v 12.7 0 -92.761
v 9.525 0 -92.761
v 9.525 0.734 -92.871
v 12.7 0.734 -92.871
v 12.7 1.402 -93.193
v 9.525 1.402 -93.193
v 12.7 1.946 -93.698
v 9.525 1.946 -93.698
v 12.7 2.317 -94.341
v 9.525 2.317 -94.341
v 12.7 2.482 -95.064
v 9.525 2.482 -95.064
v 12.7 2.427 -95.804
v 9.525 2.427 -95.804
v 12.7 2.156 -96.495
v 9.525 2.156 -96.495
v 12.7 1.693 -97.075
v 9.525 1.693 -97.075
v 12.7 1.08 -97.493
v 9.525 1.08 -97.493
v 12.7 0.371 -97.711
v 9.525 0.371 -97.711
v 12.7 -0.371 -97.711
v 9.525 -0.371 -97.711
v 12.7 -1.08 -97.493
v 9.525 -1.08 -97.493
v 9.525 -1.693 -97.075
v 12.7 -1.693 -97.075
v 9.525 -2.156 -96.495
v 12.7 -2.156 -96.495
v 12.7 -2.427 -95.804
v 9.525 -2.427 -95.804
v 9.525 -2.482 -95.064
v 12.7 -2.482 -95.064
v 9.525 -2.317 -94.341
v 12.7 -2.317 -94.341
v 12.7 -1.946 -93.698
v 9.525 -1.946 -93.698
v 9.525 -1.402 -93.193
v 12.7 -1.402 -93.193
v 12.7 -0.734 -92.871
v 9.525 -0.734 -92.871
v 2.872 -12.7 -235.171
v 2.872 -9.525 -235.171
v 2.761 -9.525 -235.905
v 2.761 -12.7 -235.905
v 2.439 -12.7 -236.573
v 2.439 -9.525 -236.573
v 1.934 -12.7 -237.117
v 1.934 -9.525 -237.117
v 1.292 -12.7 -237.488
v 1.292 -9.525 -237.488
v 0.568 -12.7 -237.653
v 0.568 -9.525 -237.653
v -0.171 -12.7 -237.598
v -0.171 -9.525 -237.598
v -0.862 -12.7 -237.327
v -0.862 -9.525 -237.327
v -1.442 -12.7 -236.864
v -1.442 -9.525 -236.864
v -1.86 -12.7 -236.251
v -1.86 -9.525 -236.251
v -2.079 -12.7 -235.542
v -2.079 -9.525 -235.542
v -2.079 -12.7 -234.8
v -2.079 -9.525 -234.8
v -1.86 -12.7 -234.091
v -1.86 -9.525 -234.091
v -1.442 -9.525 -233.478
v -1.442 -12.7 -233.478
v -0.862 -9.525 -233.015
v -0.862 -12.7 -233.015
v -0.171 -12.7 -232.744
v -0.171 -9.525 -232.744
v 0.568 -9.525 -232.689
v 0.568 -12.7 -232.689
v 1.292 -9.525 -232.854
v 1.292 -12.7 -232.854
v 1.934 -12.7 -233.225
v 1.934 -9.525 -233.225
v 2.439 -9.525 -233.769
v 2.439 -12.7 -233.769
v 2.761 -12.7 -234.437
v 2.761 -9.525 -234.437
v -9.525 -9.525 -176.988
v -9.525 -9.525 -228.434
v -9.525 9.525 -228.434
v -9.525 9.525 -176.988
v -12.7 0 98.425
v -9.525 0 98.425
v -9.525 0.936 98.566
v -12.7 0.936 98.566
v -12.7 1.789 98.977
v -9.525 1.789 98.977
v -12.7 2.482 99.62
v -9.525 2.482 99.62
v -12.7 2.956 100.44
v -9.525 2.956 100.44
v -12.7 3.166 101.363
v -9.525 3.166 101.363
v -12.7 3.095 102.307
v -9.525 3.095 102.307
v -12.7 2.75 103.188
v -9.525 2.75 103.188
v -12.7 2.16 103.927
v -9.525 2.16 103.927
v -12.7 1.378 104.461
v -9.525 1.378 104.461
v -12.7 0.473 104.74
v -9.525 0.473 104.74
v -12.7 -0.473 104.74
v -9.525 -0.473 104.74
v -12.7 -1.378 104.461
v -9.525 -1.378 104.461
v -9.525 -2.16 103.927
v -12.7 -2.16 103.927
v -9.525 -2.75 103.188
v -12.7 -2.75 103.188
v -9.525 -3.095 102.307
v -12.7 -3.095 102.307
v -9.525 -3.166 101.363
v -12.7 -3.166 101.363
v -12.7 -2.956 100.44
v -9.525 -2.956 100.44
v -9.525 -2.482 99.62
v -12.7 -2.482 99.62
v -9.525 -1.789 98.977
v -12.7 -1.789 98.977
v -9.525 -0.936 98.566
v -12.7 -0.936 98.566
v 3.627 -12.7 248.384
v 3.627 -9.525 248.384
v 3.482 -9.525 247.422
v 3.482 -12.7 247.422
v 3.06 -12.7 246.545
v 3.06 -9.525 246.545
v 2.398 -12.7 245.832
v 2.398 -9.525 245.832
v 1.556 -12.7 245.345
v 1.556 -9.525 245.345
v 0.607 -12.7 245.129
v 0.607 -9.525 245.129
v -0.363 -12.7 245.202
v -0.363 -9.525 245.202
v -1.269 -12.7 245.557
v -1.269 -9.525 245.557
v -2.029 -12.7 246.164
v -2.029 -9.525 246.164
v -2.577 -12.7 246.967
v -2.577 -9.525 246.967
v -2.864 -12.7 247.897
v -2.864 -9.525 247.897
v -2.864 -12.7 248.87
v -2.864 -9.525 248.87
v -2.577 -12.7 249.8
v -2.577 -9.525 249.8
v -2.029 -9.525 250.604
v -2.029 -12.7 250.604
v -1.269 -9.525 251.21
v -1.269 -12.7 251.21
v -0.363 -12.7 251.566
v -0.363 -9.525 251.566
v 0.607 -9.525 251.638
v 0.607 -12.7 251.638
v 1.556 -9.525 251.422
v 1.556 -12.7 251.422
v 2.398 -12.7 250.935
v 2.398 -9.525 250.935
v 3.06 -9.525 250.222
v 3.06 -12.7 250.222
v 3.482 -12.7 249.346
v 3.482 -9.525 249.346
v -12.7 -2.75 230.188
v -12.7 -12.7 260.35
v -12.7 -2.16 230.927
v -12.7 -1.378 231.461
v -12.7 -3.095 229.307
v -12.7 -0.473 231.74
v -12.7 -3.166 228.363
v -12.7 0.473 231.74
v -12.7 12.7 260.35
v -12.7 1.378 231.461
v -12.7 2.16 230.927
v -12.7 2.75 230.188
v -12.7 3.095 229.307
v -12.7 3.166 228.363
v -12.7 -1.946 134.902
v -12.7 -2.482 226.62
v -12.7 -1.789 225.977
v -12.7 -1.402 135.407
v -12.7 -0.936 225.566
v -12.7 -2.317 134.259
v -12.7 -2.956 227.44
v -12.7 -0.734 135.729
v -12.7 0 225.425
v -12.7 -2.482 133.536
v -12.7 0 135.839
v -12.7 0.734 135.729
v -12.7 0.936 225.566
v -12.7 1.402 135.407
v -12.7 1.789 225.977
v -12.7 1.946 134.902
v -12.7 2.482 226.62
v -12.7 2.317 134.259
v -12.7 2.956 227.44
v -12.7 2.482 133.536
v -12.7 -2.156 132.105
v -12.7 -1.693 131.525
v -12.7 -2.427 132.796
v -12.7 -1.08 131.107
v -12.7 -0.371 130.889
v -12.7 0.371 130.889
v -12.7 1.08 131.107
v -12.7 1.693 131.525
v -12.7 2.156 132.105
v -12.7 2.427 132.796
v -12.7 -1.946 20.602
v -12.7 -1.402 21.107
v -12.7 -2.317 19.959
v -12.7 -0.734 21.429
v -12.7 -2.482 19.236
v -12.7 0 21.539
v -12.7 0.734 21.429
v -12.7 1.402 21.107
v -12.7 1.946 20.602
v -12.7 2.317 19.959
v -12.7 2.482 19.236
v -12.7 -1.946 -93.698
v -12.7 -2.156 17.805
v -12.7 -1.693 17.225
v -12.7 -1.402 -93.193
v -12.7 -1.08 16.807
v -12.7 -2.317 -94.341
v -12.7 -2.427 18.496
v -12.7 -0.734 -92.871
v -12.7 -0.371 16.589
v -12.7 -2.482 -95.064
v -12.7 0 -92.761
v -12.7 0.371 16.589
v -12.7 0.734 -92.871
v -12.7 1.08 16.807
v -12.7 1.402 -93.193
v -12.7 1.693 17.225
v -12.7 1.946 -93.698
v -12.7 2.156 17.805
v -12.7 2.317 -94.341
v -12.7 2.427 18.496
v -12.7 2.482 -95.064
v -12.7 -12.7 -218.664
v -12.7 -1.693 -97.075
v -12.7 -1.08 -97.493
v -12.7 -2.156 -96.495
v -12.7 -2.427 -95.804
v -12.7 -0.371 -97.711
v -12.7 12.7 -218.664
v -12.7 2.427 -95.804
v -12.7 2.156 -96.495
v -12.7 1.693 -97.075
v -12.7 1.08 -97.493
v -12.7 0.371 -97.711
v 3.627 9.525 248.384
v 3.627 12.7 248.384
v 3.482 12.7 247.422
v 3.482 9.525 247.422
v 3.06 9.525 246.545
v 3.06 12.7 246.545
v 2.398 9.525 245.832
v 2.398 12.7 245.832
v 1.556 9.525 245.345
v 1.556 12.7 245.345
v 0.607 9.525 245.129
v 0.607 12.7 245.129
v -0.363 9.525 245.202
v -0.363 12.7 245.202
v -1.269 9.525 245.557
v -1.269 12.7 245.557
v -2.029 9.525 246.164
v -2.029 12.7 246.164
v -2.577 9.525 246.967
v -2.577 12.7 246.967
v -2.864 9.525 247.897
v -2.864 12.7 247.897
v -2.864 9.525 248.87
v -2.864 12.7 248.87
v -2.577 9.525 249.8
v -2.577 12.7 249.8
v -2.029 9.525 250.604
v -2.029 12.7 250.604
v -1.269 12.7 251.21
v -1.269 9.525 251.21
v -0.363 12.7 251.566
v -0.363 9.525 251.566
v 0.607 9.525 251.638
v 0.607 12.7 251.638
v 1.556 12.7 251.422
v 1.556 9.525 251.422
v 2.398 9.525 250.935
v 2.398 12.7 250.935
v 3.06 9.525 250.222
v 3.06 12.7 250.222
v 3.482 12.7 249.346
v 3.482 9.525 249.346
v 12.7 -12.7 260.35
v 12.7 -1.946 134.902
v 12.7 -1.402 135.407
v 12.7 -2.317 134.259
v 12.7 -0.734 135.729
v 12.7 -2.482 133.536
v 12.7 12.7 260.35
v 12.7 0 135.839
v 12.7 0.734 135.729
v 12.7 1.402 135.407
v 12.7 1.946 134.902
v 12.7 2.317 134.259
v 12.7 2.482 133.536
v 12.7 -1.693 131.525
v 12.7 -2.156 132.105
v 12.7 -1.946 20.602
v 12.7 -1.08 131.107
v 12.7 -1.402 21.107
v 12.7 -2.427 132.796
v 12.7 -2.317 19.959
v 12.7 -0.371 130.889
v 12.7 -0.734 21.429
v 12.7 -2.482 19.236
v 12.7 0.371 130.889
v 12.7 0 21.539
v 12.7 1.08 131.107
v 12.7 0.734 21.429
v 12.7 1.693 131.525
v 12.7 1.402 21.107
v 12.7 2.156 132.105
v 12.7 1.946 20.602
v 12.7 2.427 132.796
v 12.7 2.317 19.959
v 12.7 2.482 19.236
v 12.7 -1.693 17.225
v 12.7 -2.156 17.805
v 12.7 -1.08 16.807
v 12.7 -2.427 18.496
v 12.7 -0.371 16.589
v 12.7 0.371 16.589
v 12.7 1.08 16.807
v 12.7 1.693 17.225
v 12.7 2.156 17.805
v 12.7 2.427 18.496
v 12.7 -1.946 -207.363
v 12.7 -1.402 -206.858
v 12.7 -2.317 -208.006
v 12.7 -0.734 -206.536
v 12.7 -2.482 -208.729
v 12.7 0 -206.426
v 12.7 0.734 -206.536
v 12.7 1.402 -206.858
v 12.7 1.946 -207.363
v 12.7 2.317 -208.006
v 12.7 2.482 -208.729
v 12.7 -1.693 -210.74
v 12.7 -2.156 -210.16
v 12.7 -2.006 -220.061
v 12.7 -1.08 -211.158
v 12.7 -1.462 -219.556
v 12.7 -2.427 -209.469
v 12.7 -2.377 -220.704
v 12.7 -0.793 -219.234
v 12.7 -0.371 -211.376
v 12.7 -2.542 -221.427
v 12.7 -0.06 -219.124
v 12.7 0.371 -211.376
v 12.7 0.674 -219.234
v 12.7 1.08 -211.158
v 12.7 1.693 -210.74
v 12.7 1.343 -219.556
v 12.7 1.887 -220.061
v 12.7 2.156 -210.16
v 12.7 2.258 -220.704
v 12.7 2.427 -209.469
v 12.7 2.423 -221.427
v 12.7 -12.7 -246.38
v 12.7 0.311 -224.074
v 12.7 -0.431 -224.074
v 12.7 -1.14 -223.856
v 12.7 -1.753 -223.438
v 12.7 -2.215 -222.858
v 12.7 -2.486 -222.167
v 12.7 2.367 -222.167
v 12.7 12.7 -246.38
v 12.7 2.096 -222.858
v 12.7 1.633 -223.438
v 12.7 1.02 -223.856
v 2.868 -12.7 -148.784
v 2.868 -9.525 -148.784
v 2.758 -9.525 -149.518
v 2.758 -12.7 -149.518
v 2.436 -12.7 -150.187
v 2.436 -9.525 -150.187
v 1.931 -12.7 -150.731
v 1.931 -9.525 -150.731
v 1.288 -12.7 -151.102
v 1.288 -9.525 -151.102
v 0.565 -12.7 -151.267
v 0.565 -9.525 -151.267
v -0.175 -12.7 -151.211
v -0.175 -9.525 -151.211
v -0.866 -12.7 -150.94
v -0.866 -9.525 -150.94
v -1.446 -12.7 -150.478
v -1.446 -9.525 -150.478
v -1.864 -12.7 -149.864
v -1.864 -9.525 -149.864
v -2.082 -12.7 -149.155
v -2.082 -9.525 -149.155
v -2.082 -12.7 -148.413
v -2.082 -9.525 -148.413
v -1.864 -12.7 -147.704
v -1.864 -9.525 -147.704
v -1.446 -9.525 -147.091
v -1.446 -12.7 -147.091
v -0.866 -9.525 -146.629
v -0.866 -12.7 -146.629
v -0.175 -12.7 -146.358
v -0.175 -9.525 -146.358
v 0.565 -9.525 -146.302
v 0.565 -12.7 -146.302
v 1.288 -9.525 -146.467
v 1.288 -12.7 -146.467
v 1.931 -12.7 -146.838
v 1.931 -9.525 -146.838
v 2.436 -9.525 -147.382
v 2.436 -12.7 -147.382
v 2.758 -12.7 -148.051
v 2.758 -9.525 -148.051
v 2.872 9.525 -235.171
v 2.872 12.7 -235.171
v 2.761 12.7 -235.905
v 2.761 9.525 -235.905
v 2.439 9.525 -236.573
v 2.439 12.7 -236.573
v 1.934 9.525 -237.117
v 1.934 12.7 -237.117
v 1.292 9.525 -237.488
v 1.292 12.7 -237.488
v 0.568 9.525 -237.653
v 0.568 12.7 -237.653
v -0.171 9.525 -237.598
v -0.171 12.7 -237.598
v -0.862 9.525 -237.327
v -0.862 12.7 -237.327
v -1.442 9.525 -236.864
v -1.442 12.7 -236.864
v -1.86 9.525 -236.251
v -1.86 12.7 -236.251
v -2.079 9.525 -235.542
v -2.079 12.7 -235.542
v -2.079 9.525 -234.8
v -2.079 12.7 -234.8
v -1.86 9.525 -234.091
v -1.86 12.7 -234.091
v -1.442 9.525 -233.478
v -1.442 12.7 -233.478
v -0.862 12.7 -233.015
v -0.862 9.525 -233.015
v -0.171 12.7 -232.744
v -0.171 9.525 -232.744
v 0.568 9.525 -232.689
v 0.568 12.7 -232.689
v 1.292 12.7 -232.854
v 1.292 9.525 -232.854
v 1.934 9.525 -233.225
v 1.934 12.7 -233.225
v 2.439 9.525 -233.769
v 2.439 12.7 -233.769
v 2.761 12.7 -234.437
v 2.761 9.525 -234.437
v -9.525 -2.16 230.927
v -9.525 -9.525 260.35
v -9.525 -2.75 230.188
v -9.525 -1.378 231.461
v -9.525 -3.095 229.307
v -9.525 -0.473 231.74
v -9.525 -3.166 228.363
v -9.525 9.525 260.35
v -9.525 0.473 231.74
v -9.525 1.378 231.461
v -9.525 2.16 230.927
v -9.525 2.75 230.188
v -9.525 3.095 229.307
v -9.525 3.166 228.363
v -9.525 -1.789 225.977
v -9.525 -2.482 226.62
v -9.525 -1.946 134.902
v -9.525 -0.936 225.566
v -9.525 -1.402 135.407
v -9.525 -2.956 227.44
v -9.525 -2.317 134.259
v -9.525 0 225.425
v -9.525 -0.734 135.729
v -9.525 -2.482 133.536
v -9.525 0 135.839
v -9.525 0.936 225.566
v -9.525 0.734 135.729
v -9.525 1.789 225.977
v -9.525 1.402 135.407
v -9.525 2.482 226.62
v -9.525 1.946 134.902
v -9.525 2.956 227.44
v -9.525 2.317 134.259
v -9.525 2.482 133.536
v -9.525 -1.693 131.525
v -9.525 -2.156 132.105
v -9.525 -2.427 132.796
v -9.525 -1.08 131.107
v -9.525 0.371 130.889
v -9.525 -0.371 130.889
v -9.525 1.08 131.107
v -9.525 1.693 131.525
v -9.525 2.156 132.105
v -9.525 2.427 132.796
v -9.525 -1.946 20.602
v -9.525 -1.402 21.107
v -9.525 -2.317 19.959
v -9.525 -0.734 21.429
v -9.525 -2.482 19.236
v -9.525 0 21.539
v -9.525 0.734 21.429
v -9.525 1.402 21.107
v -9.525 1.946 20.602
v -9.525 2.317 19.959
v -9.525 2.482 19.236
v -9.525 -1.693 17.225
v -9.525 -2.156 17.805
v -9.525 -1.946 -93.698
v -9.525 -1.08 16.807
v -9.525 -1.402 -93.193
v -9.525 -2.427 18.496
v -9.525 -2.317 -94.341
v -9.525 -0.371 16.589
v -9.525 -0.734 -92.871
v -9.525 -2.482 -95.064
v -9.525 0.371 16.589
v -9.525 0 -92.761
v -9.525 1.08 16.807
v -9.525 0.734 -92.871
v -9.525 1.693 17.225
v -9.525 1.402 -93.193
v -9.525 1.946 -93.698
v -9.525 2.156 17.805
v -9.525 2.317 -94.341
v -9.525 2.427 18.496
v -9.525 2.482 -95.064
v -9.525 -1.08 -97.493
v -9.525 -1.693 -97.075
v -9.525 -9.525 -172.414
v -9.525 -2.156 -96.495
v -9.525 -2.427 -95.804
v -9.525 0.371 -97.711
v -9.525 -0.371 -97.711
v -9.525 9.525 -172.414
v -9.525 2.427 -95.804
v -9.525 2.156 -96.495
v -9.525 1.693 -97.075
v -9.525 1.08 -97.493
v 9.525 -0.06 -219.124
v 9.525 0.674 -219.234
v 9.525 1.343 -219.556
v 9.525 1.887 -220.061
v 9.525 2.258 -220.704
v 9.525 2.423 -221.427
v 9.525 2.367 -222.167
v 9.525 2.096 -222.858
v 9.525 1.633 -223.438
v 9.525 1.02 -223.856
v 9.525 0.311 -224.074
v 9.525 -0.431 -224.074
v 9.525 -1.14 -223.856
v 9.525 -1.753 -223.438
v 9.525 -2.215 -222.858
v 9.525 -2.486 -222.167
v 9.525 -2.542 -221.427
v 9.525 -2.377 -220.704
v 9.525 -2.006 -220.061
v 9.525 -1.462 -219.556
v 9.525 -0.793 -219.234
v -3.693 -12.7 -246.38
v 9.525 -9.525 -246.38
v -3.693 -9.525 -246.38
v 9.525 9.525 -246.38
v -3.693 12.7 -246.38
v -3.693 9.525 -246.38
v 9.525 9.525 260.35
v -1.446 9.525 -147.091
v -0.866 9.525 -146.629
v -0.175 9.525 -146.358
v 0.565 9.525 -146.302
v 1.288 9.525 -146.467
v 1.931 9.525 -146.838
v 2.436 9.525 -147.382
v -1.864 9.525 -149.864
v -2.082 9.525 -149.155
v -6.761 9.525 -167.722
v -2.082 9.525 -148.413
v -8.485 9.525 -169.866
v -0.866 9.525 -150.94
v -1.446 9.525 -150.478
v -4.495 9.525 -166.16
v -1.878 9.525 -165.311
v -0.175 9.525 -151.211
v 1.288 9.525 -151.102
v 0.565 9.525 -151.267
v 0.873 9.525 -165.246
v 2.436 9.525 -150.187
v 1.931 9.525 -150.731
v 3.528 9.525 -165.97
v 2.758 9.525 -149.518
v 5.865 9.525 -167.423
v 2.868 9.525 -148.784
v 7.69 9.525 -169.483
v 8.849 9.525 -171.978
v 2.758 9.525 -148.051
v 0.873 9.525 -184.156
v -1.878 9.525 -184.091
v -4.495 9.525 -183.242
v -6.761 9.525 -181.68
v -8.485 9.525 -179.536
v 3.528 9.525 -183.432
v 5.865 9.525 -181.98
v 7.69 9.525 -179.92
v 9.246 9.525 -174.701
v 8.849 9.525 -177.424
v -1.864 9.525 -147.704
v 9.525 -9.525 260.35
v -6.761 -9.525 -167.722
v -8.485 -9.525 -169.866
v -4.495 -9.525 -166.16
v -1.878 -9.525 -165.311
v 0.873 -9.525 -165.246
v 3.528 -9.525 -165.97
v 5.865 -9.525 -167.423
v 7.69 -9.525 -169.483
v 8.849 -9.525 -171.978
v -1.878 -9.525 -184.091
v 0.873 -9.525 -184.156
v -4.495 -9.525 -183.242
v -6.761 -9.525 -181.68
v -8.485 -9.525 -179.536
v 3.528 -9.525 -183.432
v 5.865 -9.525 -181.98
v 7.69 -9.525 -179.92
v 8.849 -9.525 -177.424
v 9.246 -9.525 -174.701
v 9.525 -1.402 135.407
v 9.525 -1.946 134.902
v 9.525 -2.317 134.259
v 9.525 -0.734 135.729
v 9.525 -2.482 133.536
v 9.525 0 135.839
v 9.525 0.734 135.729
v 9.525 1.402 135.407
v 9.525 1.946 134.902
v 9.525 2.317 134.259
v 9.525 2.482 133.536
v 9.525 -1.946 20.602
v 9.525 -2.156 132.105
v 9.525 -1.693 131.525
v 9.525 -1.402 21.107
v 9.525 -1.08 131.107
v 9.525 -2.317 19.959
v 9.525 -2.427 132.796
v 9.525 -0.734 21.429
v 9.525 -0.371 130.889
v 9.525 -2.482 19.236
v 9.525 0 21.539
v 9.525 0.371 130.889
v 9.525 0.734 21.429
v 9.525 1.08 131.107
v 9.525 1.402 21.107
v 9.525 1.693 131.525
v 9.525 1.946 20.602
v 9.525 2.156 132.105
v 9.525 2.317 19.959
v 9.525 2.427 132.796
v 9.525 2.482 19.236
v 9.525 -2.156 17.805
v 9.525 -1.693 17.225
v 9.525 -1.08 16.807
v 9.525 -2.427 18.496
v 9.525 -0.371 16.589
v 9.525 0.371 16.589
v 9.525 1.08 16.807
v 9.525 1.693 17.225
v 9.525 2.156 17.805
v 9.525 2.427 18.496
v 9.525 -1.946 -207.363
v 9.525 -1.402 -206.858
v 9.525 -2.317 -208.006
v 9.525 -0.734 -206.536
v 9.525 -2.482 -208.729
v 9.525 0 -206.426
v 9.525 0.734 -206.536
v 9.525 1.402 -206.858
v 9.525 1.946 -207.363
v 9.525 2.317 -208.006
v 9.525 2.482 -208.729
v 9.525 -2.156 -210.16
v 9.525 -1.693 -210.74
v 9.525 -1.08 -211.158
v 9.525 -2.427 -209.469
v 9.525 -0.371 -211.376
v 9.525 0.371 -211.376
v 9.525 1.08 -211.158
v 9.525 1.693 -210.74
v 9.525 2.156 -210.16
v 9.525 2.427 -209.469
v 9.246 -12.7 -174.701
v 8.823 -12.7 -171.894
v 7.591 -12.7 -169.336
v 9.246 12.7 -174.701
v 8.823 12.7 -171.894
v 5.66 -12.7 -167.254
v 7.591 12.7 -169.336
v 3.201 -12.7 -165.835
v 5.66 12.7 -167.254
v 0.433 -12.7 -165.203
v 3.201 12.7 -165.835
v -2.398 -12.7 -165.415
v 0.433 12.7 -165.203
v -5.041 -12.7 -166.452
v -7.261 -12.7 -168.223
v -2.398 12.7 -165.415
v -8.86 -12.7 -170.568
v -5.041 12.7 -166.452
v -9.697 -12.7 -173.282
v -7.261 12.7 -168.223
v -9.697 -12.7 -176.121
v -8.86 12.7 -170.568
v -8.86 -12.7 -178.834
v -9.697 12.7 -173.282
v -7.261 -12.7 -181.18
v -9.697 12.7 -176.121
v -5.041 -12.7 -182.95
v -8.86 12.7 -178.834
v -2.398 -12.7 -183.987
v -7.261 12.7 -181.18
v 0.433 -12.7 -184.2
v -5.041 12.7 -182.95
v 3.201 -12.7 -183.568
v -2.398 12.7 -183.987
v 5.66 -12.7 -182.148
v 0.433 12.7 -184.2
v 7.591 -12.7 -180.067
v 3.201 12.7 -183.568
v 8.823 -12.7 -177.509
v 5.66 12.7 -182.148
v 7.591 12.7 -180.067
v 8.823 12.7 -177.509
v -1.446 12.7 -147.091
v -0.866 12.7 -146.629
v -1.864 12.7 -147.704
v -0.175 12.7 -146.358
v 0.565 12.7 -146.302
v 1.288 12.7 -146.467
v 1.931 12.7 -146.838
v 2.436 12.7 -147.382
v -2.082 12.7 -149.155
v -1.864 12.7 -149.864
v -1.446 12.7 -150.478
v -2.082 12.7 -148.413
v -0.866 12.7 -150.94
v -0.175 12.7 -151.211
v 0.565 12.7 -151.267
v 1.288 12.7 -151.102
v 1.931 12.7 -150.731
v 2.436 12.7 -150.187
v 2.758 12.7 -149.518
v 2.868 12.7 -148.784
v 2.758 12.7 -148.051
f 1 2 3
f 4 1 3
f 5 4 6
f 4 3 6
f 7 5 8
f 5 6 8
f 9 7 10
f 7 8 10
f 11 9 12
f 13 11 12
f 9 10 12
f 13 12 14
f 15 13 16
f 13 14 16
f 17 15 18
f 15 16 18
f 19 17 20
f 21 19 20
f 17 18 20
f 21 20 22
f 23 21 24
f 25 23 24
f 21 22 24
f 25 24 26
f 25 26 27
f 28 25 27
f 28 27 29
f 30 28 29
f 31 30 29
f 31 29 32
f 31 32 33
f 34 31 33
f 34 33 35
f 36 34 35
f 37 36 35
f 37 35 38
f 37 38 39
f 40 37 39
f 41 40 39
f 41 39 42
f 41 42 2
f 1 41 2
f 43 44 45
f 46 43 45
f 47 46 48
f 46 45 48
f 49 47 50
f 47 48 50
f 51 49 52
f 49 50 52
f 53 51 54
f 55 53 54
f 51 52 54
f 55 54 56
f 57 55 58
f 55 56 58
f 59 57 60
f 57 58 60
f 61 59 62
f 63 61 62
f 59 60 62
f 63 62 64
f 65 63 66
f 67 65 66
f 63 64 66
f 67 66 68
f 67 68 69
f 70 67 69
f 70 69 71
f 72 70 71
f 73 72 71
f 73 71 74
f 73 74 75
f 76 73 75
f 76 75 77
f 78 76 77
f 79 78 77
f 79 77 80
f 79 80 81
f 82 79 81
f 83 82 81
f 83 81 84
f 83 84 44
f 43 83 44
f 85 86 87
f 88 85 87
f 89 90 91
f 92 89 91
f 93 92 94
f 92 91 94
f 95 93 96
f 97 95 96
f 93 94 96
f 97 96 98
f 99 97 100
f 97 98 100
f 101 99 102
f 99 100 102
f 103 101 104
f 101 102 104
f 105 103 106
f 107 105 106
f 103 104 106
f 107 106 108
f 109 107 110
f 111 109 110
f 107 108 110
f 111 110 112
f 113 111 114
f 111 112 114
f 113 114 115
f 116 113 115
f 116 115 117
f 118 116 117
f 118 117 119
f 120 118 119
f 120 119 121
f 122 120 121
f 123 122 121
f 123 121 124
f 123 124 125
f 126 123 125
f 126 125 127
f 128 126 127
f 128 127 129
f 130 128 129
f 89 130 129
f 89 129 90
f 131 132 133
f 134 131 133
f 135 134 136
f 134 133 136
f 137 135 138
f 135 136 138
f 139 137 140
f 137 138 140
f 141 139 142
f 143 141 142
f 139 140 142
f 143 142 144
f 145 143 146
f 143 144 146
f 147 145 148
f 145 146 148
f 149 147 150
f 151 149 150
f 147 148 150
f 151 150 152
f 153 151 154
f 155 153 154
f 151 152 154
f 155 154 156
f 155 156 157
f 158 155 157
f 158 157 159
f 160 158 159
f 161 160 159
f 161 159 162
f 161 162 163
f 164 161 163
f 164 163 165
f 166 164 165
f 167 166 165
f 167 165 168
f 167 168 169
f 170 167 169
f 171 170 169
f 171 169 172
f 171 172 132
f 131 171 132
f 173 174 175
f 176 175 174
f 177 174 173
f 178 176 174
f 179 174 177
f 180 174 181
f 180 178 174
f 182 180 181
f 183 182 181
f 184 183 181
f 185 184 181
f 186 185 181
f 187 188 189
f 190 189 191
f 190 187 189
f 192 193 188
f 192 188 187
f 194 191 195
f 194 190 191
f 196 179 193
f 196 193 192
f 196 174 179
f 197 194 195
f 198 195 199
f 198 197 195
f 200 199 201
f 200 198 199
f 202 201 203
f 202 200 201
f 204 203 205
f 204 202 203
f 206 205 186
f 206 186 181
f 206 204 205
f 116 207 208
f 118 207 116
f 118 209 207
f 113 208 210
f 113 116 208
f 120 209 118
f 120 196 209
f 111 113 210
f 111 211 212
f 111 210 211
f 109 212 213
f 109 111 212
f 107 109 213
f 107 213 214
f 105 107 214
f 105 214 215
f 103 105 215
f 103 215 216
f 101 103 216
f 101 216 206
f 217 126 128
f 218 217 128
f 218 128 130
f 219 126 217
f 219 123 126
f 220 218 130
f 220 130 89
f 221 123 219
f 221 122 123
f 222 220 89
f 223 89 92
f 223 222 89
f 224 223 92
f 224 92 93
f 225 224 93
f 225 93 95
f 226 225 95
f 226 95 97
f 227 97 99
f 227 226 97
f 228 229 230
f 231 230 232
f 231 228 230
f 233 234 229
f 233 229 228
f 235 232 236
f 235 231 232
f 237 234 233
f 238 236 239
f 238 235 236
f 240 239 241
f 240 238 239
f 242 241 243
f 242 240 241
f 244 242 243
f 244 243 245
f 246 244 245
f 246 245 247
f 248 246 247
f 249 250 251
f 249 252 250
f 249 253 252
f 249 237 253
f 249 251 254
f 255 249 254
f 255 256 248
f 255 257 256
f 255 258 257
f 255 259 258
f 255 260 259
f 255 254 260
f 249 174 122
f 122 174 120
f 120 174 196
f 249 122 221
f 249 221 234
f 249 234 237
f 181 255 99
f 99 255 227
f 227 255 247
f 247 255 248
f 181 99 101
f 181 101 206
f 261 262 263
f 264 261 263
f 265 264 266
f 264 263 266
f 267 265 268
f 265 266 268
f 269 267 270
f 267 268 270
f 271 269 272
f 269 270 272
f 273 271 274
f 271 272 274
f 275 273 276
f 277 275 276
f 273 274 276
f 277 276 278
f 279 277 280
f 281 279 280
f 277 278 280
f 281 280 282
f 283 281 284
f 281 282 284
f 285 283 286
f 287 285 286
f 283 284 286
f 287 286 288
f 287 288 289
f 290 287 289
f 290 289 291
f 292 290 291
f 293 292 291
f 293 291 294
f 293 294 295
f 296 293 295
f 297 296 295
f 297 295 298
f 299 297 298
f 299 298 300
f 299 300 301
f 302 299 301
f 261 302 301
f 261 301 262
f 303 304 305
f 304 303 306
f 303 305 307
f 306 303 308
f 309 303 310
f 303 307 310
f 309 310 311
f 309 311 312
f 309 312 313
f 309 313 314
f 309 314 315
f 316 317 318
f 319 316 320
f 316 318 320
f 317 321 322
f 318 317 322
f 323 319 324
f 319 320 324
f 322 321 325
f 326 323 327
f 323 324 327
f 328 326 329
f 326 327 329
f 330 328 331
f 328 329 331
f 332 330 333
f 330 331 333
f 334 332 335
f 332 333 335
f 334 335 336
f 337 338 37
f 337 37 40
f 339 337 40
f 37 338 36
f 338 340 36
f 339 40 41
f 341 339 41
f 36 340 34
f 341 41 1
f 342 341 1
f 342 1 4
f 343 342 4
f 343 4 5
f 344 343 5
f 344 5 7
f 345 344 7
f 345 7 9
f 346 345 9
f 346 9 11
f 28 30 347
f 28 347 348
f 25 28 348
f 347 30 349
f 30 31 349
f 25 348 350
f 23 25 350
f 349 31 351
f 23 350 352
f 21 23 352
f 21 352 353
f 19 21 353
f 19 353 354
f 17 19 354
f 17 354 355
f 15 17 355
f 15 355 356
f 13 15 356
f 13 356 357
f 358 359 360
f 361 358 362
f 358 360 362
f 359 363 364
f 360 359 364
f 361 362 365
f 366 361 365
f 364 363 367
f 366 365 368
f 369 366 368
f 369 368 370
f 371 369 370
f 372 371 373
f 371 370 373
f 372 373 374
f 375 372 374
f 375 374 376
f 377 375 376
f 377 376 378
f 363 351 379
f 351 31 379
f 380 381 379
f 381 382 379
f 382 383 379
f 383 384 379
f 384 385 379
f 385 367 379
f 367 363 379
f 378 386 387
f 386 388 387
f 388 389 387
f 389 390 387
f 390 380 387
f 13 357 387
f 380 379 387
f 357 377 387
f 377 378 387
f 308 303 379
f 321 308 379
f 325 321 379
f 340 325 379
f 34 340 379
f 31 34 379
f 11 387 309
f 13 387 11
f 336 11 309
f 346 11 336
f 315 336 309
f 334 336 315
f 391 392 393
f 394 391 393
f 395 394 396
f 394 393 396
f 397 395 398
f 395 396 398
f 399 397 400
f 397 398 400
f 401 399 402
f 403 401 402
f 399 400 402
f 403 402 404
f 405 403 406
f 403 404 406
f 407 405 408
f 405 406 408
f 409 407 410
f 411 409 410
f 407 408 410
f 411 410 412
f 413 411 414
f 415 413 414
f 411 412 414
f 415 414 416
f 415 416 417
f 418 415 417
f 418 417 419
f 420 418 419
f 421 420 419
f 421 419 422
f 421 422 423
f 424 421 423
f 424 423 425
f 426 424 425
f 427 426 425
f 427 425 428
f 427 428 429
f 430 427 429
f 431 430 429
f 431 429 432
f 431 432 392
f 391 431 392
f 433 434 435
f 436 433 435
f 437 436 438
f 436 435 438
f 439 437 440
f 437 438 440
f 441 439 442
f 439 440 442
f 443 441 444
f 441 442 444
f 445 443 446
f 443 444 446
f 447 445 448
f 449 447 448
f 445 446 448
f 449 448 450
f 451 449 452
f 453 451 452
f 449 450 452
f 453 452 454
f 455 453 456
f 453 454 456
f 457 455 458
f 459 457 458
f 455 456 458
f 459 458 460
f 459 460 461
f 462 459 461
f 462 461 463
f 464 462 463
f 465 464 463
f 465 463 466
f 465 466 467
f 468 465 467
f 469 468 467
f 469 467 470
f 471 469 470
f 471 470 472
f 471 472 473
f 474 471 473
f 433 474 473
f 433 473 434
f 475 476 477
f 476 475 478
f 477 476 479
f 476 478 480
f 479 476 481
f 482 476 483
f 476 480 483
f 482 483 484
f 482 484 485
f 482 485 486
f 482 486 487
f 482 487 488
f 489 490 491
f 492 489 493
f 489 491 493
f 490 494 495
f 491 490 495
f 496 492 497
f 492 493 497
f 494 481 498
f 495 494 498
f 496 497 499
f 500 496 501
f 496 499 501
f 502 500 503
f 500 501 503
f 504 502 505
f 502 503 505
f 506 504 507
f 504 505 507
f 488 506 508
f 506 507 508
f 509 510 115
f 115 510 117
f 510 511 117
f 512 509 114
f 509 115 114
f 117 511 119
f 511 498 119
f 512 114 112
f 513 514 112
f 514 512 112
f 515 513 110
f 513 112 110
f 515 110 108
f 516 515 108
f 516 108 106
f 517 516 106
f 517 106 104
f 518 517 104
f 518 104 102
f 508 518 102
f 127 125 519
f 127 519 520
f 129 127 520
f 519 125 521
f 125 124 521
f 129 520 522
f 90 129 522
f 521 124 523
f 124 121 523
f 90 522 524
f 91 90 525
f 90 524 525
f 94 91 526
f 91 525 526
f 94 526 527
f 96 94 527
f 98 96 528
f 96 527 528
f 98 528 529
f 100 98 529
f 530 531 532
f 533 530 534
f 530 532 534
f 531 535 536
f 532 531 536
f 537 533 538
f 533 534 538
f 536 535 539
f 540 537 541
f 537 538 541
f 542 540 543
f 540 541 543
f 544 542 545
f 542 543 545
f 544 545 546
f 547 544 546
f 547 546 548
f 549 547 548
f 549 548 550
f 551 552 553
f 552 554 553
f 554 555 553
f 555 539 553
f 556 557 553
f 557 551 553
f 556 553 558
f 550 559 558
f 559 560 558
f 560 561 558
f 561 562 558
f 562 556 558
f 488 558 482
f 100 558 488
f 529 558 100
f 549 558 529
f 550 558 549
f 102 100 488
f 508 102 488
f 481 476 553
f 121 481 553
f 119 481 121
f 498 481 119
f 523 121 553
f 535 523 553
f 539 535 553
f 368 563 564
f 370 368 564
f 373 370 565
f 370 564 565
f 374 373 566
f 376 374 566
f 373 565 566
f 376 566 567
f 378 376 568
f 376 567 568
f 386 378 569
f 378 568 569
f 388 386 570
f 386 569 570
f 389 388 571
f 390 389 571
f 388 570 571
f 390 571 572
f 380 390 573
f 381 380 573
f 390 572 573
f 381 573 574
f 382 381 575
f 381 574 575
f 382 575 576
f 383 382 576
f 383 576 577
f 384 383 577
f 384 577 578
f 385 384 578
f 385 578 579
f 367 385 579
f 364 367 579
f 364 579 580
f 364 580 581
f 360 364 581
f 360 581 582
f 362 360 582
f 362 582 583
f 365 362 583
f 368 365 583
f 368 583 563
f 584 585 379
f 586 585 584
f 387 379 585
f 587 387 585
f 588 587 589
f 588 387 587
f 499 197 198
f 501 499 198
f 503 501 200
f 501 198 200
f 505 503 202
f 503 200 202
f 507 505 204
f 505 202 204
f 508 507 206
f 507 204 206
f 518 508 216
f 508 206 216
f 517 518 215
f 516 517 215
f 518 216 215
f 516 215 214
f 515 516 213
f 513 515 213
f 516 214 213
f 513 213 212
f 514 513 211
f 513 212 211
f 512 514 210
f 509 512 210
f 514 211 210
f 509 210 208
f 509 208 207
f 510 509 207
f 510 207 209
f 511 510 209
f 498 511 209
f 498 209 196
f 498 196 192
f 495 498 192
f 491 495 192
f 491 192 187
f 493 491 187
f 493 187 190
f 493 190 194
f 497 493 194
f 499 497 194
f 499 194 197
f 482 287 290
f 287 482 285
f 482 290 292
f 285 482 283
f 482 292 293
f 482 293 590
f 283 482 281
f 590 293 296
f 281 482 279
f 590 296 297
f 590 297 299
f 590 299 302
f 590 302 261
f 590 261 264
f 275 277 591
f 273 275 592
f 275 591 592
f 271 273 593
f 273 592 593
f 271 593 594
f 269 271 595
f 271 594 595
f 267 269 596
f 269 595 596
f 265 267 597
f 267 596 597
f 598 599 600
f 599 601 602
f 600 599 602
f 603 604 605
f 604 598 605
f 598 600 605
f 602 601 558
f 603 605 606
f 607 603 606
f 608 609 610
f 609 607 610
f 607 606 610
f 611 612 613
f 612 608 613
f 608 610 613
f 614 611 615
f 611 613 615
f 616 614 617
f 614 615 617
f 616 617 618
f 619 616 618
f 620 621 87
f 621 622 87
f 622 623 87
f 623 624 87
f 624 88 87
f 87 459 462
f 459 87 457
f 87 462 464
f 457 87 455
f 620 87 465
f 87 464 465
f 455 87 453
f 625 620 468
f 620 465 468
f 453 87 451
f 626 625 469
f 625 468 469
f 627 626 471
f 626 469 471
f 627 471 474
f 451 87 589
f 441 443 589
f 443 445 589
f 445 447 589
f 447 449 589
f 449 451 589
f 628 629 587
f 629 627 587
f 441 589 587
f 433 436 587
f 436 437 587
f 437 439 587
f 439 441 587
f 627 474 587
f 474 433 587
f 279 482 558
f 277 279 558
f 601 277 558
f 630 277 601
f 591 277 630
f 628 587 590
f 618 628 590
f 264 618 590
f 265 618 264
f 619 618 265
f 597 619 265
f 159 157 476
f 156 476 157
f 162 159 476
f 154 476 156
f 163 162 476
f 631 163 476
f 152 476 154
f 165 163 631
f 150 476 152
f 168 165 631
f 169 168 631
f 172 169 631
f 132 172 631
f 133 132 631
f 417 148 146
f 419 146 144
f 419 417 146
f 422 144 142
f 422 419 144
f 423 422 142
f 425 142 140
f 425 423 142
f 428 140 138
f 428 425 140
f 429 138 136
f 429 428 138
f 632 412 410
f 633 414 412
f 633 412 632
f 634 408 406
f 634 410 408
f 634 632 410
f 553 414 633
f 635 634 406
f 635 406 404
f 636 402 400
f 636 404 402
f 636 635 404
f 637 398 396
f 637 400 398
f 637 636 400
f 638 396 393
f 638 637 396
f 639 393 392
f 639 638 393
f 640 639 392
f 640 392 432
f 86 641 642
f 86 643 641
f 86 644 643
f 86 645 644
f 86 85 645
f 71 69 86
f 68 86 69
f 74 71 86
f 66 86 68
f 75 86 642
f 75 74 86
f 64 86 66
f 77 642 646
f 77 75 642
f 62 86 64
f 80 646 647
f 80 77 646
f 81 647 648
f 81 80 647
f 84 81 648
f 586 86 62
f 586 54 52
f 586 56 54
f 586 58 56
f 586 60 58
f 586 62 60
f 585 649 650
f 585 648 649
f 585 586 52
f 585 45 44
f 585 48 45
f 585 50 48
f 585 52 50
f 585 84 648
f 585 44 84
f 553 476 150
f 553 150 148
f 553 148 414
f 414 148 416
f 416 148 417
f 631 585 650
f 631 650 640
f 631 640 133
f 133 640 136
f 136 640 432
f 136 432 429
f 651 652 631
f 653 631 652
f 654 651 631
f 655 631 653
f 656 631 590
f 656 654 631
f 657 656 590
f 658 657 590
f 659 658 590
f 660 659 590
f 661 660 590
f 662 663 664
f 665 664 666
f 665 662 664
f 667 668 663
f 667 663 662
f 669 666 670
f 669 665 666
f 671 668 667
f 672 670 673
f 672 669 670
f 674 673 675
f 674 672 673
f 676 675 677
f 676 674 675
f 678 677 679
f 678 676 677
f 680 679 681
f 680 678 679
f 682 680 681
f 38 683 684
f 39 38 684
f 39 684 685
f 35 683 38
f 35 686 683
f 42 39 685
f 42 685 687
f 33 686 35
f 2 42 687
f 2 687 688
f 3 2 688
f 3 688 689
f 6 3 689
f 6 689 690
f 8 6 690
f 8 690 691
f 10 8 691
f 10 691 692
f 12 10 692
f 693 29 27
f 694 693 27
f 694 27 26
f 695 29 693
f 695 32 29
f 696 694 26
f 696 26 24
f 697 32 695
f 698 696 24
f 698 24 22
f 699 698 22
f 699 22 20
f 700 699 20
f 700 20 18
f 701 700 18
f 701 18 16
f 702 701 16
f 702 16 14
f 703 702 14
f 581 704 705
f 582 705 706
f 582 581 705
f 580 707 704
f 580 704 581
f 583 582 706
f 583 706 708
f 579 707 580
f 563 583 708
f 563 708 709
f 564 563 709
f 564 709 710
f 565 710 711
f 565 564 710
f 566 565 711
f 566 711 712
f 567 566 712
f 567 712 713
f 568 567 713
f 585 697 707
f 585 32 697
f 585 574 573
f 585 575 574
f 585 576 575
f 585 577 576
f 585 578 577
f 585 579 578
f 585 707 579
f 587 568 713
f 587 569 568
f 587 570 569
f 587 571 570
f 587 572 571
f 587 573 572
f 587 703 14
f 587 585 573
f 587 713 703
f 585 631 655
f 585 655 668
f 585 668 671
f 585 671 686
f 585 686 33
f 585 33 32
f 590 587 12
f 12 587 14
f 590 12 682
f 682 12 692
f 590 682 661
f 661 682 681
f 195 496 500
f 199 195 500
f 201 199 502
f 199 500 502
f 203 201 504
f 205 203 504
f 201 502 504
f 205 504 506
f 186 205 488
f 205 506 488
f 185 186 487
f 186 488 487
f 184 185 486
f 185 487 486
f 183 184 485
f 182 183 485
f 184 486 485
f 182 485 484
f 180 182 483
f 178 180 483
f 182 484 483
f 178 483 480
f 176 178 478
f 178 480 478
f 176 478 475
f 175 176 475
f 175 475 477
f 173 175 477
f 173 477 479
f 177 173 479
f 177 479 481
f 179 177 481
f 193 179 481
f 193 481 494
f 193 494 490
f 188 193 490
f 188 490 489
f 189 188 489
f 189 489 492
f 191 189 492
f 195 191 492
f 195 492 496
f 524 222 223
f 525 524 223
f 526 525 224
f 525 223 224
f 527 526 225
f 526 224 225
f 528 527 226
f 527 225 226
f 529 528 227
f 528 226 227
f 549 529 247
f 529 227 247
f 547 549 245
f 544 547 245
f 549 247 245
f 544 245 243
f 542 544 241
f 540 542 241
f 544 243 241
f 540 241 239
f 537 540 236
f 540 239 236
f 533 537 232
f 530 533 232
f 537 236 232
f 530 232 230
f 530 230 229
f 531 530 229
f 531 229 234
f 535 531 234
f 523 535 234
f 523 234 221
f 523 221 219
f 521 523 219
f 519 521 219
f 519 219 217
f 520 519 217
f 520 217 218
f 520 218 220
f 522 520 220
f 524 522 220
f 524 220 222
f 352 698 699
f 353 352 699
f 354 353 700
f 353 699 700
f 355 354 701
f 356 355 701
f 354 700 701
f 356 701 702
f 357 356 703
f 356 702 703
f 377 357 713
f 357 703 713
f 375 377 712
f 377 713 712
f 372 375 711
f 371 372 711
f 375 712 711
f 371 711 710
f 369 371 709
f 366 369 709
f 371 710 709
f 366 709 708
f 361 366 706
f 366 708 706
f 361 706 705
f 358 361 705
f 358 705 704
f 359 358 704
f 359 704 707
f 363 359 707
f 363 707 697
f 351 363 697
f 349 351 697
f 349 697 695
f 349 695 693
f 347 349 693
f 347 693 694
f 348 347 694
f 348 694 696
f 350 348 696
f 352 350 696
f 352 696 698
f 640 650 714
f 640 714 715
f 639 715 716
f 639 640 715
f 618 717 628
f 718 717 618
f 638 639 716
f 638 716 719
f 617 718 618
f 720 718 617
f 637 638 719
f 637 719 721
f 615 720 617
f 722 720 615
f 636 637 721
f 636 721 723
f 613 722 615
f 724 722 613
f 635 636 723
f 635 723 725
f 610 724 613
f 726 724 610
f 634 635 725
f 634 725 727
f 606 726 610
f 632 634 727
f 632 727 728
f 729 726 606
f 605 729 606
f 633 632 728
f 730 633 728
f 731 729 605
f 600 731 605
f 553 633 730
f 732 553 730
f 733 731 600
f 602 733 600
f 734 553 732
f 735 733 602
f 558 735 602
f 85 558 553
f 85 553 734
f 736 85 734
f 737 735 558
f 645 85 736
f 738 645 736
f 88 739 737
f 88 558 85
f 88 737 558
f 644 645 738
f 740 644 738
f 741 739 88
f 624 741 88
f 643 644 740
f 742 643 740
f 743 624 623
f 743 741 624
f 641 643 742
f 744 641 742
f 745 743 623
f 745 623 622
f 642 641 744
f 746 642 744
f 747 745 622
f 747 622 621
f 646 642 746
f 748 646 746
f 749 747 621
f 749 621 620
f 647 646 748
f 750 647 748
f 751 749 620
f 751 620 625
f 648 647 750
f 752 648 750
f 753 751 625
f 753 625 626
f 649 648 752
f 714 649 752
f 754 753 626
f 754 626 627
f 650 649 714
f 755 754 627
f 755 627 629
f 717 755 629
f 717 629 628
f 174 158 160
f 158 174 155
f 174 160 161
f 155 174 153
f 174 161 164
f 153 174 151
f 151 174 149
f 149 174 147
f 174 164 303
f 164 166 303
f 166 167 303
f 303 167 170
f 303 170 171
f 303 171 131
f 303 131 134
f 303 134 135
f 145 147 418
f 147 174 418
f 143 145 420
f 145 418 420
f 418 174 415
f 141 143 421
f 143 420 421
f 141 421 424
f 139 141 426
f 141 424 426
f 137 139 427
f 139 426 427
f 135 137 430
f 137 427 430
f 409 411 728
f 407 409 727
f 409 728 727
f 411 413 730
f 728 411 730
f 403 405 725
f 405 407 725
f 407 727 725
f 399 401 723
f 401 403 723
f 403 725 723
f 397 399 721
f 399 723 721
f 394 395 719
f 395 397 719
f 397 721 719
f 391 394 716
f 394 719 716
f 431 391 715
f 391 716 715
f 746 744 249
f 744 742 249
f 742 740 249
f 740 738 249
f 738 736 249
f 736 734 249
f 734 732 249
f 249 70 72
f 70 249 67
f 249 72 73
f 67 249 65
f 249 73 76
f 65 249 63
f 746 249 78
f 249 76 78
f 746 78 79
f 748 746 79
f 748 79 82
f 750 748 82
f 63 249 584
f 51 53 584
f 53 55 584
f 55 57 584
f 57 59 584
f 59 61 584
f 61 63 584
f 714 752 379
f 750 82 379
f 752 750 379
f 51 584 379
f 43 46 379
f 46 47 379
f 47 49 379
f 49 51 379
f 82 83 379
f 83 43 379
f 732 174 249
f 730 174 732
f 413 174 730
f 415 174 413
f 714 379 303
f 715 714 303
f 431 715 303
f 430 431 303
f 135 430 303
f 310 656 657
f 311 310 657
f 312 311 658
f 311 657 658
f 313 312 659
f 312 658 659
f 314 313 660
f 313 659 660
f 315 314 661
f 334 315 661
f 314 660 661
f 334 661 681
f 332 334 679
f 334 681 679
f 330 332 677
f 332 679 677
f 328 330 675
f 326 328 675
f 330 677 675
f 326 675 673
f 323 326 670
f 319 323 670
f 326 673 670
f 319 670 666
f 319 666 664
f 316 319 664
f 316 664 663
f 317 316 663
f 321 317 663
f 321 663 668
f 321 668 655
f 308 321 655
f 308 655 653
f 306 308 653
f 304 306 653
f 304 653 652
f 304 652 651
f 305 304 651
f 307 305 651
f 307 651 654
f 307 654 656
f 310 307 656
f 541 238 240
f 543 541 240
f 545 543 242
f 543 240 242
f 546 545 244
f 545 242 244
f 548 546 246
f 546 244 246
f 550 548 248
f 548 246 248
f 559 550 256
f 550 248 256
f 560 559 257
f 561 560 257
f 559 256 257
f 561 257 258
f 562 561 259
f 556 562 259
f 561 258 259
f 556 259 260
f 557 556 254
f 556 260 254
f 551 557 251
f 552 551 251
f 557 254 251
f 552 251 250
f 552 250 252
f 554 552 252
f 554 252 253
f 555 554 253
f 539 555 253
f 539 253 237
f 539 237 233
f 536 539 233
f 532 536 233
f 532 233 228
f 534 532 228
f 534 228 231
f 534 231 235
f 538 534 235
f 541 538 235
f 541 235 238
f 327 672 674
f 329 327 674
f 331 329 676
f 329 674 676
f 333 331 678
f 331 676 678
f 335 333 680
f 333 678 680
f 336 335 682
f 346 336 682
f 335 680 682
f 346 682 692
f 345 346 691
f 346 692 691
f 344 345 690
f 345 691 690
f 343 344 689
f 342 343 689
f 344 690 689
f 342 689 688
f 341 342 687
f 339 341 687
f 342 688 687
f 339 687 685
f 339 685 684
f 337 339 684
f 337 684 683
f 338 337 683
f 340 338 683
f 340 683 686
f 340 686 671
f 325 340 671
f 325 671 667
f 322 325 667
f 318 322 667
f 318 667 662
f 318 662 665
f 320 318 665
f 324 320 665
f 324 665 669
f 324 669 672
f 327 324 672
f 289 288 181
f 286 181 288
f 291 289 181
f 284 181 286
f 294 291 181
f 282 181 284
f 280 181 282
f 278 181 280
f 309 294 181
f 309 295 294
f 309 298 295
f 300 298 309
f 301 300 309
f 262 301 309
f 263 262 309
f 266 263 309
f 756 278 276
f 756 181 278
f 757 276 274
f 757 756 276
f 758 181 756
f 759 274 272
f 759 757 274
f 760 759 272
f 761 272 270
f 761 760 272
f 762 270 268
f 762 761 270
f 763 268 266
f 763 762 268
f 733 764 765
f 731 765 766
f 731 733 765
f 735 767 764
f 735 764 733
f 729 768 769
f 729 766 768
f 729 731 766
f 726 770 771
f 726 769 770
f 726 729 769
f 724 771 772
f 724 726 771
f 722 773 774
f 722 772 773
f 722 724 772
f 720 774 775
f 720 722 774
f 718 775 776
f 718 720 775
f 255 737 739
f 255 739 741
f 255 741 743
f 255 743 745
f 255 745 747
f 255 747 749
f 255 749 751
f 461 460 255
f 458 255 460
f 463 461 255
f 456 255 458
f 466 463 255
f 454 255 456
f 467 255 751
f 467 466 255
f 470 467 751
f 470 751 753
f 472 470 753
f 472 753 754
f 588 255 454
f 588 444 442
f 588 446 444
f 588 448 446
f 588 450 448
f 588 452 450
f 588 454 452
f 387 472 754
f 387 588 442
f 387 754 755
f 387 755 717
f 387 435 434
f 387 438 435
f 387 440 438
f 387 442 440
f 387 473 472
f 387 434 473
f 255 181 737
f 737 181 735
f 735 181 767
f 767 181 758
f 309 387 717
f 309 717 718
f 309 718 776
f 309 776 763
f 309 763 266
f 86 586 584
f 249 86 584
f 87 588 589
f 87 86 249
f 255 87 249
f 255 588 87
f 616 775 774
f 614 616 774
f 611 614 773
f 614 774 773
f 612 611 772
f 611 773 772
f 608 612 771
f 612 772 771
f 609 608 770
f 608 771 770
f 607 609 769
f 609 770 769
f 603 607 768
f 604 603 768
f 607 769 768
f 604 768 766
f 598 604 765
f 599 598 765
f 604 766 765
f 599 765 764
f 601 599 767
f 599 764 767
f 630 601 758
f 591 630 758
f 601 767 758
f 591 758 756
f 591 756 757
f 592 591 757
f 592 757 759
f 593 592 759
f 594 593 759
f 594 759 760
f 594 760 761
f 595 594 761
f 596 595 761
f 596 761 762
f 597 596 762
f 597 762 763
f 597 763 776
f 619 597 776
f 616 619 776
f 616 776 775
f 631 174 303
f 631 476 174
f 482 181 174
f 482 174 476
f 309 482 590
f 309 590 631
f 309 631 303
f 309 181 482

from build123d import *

# Parameters (mm, degrees)
BOSS_EXTRUDE1_DEPTH             = 260.35
BOSS_EXTRUDE1_DEPTH_BACK        = 260.35
SKETCH3_W                       = 25.4
SKETCH3_H                       = 25.4
SKETCH3_W_2                     = 19.05
SKETCH3_H_2                     = 19.05
CUT_EXTRUDE1_DEPTH              = 25.4
SKETCH5_R                       = 9.525
CUT_EXTRUDE2_DEPTH              = 262.894200967
F_10_CLEARANCE_HOLE2_D          = 4.9784
F_1_4_CLEARANCE_HOLE1_D         = 6.5278
F_10_CLEARANCE_HOLE3_D          = 4.9784
F_10_CLEARANCE_HOLE3_DEPTH      = 5.08
F_10_CLEARANCE_HOLE3_TIP        = 1.495662253
F_10_CLEARANCE_HOLE4_D          = 4.9784
F_1_4_0_25_DIAMETER_HOLE1_D     = 6.35
F_1_4_0_25_DIAMETER_HOLE1_DEPTH = 5.08
F_1_4_0_25_DIAMETER_HOLE1_TIP   = 1.907732465


with BuildPart() as part:
    # Sketch3 → Boss-Extrude1 (new, two sides: drawn at the far end of the back side and taken through both)
    with BuildSketch(Plane.XY.offset(-BOSS_EXTRUDE1_DEPTH_BACK)):
        Rectangle(SKETCH3_W, SKETCH3_H)
        Rectangle(SKETCH3_W_2, SKETCH3_H_2, mode=Mode.SUBTRACT)
    extrude(amount=BOSS_EXTRUDE1_DEPTH + BOSS_EXTRUDE1_DEPTH_BACK)

    # Sketch4 → Cut-Extrude1 (cut)
    with BuildSketch(Plane(origin=(0, 12.7, 0), x_dir=(1, 0, 0), z_dir=(0, 1, 0))):
        Polygon((-12.7, 218.66352), (-12.7, 260.35), (12.7, 260.35), (12.7, 246.38), (-3.69316, 246.38), align=None)
    extrude(amount=-CUT_EXTRUDE1_DEPTH, mode=Mode.SUBTRACT)

    # Sketch5 → Cut-Extrude2 (cut, through all)
    with BuildSketch(Plane.XZ.offset(-12.7)):
        with Locations((-0.278650599, -174.701227009)):
            Circle(SKETCH5_R)
    extrude(amount=CUT_EXTRUDE2_DEPTH, mode=Mode.SUBTRACT)

    # #10 Clearance Hole2 (through all)
    with Locations(Plane(origin=(0, -12.7, 0), x_dir=(-1, 0, 0), z_dir=(0, -1, 0))):
        with Locations((-0.379005456, 148.784459399), (-0.382415863, 235.170979471)):
            Hole(F_10_CLEARANCE_HOLE2_D / 2)

    # 1/4 Clearance Hole1 (through all)
    with Locations(Plane(origin=(0, -12.7, 0), x_dir=(-1, 0, 0), z_dir=(0, -1, 0))):
        with Locations((-0.363325871, -248.383604688)):
            Hole(F_1_4_CLEARANCE_HOLE1_D / 2)

    # #10 Clearance Hole3
    with Locations(Plane(origin=(12.7, 0, 0), x_dir=(0, 0, -1), z_dir=(1, 0, 0))):
        with Locations((221.61290974, -0.059596136), (208.915, 0)):
            Hole(F_10_CLEARANCE_HOLE3_D / 2, depth=F_10_CLEARANCE_HOLE3_DEPTH)
            with Locations((0, 0, -(F_10_CLEARANCE_HOLE3_DEPTH + F_10_CLEARANCE_HOLE3_TIP / 2))):  # 118° drill point
                Cone(0, F_10_CLEARANCE_HOLE3_D / 2, F_10_CLEARANCE_HOLE3_TIP, mode=Mode.SUBTRACT)

    # #10 Clearance Hole4 (through all)
    with Locations(Plane(origin=(12.7, 0, 0), x_dir=(0, 0, -1), z_dir=(1, 0, 0))):
        with Locations((-133.35, 0), (-19.05, 0), (95.25, 0)):
            Hole(F_10_CLEARANCE_HOLE4_D / 2)

    # 1/4 (0.25) Diameter Hole1
    with Locations(Plane.ZY.offset(12.7)):
        with Locations((101.6, 0), (228.6, 0)):
            Hole(F_1_4_0_25_DIAMETER_HOLE1_D / 2, depth=F_1_4_0_25_DIAMETER_HOLE1_DEPTH)
            with Locations((0, 0, -(F_1_4_0_25_DIAMETER_HOLE1_DEPTH + F_1_4_0_25_DIAMETER_HOLE1_TIP / 2))):  # 118° drill point
                Cone(0, F_1_4_0_25_DIAMETER_HOLE1_D / 2, F_1_4_0_25_DIAMETER_HOLE1_TIP, mode=Mode.SUBTRACT)


solid = part.part
